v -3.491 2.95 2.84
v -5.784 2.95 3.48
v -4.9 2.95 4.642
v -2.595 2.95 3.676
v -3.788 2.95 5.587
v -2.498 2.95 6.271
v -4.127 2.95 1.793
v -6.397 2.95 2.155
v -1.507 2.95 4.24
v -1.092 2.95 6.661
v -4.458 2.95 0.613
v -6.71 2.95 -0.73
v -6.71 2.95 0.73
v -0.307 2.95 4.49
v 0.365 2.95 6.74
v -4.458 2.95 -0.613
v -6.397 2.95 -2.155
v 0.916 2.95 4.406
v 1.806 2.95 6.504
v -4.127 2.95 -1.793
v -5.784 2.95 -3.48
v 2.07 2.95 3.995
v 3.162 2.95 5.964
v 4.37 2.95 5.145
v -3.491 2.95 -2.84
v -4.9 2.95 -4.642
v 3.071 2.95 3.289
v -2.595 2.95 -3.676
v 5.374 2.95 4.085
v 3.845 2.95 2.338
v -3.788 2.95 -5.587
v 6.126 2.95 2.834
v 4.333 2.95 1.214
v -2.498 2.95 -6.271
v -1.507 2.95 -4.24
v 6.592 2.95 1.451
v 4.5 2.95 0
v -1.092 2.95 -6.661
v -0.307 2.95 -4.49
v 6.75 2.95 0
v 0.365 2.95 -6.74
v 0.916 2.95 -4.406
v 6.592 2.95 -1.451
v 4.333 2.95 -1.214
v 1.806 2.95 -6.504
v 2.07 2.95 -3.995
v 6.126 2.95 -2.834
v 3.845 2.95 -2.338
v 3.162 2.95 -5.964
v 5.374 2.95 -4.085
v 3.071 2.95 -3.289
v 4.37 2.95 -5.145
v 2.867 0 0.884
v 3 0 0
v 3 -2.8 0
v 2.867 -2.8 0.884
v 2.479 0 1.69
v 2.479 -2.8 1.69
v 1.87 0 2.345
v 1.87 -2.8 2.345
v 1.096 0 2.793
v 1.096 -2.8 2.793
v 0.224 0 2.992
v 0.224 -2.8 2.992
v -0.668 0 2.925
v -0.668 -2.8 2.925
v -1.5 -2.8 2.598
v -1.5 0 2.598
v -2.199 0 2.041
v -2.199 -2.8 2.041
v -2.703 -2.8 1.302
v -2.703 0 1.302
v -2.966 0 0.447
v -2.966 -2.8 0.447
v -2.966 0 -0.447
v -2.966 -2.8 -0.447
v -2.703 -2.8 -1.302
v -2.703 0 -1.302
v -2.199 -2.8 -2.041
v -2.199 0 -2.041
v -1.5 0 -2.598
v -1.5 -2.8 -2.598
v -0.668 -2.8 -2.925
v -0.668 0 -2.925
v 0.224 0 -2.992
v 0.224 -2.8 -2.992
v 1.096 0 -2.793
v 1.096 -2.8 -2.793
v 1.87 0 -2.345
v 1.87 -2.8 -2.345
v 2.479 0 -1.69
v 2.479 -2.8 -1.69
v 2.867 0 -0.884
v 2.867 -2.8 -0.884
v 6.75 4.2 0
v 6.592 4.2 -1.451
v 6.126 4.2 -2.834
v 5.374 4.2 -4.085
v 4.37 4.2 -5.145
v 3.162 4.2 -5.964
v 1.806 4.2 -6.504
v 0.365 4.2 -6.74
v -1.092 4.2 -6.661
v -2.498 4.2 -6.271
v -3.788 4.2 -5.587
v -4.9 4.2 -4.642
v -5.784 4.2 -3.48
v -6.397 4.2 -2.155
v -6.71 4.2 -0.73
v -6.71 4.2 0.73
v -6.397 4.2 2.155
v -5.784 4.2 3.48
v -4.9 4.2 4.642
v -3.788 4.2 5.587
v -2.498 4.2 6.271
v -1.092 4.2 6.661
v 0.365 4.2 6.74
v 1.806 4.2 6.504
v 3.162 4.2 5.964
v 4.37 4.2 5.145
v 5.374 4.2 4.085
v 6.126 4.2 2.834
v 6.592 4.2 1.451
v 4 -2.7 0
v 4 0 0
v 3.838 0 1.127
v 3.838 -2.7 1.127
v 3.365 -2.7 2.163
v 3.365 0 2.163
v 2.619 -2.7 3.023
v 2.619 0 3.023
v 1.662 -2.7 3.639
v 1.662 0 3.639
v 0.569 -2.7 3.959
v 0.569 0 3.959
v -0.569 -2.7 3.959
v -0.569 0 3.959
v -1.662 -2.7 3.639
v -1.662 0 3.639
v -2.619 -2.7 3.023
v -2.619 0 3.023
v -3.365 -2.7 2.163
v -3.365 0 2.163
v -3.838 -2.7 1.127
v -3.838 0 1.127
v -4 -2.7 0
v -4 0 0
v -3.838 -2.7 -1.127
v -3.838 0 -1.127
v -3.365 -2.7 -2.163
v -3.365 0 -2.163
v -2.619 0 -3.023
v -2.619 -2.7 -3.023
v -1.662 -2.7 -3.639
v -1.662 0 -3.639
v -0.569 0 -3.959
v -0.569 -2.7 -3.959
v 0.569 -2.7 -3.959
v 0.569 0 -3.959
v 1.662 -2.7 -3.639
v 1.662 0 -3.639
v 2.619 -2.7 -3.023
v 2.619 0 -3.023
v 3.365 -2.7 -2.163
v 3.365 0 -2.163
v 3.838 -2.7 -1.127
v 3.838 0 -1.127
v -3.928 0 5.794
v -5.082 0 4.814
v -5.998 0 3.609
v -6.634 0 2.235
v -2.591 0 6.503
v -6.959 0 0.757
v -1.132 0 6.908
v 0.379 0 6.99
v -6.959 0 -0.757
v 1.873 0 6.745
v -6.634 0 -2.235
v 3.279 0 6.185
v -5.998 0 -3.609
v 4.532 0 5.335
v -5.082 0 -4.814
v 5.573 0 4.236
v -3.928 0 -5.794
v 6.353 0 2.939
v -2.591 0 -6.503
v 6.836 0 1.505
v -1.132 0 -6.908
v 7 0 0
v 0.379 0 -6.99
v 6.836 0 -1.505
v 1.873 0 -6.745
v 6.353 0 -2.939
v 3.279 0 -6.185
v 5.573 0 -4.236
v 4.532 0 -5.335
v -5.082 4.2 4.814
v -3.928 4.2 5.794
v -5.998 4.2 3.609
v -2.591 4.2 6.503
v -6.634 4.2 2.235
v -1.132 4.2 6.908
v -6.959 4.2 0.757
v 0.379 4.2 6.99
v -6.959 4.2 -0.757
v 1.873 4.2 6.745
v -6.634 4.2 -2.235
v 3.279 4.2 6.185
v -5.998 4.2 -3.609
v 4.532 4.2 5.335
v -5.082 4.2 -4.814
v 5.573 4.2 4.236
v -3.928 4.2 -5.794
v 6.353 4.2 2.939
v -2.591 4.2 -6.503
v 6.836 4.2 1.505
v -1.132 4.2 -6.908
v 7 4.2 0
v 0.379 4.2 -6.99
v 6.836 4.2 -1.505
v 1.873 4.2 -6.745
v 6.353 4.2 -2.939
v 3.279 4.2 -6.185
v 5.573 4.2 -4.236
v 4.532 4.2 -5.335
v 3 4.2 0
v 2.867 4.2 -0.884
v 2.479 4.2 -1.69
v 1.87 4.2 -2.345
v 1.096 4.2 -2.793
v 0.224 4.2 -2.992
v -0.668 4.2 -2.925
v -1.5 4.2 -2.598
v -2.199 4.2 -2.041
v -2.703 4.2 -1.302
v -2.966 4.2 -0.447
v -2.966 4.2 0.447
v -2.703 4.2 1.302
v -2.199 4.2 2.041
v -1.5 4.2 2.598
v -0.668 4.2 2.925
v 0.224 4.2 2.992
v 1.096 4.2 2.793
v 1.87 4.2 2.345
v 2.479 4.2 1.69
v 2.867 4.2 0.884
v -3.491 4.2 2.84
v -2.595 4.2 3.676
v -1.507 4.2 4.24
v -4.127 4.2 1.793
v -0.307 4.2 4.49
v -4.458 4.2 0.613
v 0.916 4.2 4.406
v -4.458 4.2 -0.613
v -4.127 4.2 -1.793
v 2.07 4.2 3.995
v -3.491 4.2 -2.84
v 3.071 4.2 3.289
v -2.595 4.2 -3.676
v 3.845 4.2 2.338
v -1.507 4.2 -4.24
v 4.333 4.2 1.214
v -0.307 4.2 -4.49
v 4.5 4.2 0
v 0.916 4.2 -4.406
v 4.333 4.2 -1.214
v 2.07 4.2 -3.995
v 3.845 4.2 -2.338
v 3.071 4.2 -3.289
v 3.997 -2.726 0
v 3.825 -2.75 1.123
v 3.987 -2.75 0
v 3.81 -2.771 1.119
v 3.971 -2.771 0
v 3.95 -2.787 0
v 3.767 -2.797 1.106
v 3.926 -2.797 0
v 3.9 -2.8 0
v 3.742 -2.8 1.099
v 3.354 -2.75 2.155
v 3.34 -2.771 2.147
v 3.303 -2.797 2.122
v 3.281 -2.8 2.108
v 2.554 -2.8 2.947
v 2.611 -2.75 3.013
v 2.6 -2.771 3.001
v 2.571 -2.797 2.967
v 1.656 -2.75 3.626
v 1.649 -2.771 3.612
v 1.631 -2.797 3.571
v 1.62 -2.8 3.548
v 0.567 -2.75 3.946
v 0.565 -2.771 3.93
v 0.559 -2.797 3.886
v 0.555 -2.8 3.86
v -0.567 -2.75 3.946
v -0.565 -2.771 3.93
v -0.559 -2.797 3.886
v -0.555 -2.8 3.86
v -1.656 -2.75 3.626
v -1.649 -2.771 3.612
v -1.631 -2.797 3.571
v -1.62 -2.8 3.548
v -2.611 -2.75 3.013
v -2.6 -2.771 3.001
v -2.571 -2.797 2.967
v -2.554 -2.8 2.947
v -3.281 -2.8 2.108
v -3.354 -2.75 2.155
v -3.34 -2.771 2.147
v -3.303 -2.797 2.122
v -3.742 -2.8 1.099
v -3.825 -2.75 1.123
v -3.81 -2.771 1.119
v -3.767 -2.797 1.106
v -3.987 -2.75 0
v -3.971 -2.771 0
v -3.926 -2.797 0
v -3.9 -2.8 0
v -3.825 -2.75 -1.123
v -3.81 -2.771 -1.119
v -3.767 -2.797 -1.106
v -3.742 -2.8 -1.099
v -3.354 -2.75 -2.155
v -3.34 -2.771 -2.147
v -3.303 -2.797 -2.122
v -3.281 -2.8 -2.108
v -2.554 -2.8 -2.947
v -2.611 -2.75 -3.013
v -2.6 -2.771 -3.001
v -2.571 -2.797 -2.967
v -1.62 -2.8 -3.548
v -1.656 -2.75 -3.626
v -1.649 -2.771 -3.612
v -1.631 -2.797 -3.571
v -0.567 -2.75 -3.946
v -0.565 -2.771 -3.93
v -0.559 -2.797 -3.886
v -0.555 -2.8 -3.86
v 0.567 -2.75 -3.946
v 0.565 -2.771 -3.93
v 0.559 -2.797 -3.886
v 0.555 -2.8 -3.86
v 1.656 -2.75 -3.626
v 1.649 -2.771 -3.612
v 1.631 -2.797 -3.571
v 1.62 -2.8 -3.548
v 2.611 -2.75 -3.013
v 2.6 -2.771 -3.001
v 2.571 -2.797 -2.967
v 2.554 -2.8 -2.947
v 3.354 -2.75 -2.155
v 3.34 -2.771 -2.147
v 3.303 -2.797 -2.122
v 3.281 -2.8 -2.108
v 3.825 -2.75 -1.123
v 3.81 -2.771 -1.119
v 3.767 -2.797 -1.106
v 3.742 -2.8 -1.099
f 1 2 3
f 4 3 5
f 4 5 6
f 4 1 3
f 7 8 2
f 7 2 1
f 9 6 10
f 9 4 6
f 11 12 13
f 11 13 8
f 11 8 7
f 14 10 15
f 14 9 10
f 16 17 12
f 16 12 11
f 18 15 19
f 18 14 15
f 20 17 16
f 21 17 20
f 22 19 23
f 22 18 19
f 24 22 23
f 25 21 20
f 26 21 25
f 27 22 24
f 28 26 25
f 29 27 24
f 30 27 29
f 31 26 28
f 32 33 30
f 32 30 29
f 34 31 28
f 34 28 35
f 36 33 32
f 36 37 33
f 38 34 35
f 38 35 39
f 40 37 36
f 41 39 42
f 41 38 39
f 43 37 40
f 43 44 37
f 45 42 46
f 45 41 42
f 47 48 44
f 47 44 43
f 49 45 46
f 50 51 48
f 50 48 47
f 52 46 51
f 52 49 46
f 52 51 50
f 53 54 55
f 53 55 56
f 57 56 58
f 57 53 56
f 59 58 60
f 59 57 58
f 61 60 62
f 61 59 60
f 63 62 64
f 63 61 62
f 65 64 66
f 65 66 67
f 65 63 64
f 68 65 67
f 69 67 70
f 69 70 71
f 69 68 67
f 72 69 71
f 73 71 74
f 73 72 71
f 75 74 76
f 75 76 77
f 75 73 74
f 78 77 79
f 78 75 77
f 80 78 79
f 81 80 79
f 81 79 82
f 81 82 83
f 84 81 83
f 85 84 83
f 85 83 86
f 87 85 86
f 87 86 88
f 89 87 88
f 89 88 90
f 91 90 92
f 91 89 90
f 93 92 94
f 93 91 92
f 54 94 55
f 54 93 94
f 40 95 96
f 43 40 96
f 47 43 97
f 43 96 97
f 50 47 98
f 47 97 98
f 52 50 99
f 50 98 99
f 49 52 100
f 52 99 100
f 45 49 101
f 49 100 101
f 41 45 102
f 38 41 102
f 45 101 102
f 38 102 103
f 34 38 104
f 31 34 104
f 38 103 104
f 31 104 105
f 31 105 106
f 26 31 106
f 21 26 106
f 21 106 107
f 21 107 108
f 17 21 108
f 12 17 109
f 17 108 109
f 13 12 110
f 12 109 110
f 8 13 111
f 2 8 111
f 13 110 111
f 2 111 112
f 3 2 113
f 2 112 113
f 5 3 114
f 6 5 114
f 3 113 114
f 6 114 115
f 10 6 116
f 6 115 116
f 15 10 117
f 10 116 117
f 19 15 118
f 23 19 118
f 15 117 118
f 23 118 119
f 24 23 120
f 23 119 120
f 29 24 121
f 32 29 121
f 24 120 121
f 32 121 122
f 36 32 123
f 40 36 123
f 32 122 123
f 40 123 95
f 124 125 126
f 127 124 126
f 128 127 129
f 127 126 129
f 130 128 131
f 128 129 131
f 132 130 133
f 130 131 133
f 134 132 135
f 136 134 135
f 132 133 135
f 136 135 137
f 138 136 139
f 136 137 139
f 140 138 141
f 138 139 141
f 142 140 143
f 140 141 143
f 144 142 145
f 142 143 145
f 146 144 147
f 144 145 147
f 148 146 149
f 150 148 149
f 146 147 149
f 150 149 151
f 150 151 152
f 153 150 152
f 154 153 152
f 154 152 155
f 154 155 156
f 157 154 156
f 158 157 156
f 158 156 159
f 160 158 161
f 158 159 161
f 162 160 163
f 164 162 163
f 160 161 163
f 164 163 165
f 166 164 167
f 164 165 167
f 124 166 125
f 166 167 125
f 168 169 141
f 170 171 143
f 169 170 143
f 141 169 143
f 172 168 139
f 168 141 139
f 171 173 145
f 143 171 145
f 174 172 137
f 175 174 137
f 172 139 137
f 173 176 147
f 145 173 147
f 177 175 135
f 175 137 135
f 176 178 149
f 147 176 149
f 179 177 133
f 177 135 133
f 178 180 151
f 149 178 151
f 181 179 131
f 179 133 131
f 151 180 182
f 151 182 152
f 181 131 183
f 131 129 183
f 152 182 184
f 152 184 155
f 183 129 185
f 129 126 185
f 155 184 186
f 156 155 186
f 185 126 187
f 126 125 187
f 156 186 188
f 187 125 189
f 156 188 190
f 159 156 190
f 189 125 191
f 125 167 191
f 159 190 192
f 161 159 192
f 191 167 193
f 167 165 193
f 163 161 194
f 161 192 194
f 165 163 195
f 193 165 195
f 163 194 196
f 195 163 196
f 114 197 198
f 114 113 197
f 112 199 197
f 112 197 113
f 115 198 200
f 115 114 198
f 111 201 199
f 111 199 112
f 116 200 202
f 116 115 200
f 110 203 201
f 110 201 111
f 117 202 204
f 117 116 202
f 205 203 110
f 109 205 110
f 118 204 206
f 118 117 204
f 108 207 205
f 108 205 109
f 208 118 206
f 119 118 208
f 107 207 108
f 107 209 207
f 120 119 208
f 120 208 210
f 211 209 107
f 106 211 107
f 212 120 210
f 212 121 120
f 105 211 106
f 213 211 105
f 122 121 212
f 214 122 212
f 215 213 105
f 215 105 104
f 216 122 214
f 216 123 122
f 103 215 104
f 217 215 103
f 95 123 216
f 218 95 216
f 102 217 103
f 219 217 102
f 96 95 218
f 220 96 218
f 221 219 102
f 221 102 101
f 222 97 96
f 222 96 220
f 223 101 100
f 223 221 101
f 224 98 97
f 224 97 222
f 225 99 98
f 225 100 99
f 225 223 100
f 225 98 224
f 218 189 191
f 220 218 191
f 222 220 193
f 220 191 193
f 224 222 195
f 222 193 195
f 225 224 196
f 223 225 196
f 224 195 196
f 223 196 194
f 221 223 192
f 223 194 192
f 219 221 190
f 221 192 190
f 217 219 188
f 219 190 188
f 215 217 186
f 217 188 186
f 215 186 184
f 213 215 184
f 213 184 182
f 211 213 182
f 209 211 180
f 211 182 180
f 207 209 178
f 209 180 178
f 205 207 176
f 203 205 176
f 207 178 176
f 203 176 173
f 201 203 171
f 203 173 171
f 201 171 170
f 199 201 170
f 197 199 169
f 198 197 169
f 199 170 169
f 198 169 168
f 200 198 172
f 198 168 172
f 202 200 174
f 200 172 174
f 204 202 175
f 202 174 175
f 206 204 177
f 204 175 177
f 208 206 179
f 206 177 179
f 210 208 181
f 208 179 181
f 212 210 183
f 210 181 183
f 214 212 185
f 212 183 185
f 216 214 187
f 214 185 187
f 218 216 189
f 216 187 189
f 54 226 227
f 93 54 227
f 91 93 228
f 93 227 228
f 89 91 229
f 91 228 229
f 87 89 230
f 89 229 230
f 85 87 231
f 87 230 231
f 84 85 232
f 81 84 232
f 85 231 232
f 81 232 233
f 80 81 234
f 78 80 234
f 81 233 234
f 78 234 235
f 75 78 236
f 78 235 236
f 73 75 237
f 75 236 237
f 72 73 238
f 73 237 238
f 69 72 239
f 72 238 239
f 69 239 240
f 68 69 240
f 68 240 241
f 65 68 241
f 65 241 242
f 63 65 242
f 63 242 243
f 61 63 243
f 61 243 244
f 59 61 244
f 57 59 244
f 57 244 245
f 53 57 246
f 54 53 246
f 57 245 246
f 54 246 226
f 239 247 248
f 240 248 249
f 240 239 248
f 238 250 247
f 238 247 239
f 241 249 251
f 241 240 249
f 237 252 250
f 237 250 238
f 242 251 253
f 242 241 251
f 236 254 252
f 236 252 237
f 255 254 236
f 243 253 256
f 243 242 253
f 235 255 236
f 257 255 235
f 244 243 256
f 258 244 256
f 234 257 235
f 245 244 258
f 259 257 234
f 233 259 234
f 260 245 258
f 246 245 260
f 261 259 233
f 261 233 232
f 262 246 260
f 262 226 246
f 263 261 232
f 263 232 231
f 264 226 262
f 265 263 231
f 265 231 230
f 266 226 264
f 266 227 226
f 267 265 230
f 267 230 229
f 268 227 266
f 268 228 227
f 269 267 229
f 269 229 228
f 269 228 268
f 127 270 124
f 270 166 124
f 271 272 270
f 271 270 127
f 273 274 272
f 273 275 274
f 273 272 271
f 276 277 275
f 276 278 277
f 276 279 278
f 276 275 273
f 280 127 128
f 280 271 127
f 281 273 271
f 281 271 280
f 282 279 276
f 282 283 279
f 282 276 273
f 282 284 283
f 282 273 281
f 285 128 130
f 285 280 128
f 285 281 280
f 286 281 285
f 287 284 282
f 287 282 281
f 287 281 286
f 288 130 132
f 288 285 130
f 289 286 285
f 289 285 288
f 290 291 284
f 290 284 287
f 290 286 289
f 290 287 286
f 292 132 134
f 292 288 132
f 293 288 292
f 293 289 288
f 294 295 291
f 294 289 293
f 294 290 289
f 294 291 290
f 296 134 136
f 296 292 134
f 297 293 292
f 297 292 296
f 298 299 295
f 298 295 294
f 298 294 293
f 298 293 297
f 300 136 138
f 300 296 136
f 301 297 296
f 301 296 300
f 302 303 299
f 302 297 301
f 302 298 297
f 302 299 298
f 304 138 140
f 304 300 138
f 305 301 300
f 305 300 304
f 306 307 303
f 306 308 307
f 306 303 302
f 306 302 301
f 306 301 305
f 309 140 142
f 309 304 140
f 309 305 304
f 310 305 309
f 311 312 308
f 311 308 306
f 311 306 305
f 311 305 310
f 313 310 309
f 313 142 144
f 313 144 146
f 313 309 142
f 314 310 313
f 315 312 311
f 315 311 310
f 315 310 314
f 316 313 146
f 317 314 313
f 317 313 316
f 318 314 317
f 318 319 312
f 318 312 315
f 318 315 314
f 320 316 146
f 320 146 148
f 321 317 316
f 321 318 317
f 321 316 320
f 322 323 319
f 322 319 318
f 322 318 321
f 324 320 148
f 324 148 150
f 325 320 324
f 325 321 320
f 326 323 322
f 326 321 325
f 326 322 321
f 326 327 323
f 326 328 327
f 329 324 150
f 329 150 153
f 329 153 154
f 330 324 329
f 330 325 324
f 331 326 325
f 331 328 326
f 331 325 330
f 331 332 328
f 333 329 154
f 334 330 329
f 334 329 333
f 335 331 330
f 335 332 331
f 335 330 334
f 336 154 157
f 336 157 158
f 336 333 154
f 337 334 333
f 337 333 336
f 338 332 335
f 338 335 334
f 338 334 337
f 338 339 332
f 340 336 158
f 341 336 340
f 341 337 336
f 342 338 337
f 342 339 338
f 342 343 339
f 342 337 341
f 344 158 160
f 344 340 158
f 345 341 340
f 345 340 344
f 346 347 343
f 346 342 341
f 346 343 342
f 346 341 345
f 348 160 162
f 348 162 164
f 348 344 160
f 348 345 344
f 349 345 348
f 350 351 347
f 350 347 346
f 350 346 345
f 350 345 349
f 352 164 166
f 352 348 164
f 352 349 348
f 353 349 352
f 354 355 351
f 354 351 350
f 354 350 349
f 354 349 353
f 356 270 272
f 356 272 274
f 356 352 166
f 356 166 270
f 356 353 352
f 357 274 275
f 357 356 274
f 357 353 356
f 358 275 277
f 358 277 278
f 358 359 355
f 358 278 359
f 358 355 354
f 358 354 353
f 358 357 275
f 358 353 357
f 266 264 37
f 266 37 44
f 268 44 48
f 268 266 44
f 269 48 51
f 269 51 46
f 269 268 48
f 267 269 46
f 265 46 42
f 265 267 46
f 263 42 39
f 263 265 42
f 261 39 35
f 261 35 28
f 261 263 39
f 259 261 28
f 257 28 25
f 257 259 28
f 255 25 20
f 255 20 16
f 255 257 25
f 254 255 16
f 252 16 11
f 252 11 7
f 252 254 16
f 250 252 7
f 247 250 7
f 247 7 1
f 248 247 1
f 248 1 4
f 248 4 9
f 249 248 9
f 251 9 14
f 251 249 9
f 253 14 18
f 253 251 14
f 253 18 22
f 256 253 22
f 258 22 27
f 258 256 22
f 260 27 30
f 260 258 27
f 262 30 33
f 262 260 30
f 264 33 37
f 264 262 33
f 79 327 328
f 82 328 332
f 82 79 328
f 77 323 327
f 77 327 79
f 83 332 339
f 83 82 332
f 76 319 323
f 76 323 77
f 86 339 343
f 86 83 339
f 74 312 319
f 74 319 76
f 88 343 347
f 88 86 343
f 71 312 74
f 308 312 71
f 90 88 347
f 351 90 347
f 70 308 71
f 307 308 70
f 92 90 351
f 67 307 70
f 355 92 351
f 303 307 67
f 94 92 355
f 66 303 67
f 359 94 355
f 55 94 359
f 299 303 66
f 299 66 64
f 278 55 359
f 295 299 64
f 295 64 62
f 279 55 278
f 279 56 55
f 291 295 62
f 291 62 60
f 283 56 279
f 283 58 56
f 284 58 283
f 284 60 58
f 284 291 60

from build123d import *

# Parameters (mm, degrees)
SKETCH1_R           = 7
BOSS_EXTRUDE1_DEPTH = 4.2
SKETCH2_R           = 3
CUT_EXTRUDE1_DEPTH  = 4.2
SKETCH3_R           = 6.75
SKETCH3_R_2         = 4.5
CUT_EXTRUDE2_DEPTH  = 1.25
SKETCH4_R           = 4
SKETCH4_R_2         = 3
BOSS_EXTRUDE2_DEPTH = 2.8
FILLET1_R           = 0.1


with BuildPart() as part:
    # Sketch1 → Boss-Extrude1 (new body)
    with BuildSketch(Plane(origin=(0, 0, 0), x_dir=(1, 0, 0), z_dir=(0, 1, 0))):
        Circle(SKETCH1_R)
    extrude(amount=BOSS_EXTRUDE1_DEPTH)

    # Sketch2 → Cut-Extrude1 (cut)
    with BuildSketch(Plane(origin=(0, 4.2, 0), x_dir=(1, 0, 0), z_dir=(0, 1, 0))):
        Circle(SKETCH2_R)
    extrude(amount=-CUT_EXTRUDE1_DEPTH, mode=Mode.SUBTRACT)

    # Sketch3 → Cut-Extrude2 (cut)
    with BuildSketch(Plane(origin=(0, 4.2, 0), x_dir=(1, 0, 0), z_dir=(0, 1, 0))):
        Circle(SKETCH3_R)
        Circle(SKETCH3_R_2, mode=Mode.SUBTRACT)
    extrude(amount=-CUT_EXTRUDE2_DEPTH, mode=Mode.SUBTRACT)

    # Sketch4 → Boss-Extrude2 (add)
    with BuildSketch(Plane.XZ):
        Circle(SKETCH4_R)
        Circle(SKETCH4_R_2, mode=Mode.SUBTRACT)
    extrude(amount=BOSS_EXTRUDE2_DEPTH)

    # Fillet1
    fillet1_edges = [part.edges().sort_by_distance(p)[0] for p in [
        (-4, -2.8, 0),
    ]]
    fillet(fillet1_edges, radius=FILLET1_R)


solid = part.part
